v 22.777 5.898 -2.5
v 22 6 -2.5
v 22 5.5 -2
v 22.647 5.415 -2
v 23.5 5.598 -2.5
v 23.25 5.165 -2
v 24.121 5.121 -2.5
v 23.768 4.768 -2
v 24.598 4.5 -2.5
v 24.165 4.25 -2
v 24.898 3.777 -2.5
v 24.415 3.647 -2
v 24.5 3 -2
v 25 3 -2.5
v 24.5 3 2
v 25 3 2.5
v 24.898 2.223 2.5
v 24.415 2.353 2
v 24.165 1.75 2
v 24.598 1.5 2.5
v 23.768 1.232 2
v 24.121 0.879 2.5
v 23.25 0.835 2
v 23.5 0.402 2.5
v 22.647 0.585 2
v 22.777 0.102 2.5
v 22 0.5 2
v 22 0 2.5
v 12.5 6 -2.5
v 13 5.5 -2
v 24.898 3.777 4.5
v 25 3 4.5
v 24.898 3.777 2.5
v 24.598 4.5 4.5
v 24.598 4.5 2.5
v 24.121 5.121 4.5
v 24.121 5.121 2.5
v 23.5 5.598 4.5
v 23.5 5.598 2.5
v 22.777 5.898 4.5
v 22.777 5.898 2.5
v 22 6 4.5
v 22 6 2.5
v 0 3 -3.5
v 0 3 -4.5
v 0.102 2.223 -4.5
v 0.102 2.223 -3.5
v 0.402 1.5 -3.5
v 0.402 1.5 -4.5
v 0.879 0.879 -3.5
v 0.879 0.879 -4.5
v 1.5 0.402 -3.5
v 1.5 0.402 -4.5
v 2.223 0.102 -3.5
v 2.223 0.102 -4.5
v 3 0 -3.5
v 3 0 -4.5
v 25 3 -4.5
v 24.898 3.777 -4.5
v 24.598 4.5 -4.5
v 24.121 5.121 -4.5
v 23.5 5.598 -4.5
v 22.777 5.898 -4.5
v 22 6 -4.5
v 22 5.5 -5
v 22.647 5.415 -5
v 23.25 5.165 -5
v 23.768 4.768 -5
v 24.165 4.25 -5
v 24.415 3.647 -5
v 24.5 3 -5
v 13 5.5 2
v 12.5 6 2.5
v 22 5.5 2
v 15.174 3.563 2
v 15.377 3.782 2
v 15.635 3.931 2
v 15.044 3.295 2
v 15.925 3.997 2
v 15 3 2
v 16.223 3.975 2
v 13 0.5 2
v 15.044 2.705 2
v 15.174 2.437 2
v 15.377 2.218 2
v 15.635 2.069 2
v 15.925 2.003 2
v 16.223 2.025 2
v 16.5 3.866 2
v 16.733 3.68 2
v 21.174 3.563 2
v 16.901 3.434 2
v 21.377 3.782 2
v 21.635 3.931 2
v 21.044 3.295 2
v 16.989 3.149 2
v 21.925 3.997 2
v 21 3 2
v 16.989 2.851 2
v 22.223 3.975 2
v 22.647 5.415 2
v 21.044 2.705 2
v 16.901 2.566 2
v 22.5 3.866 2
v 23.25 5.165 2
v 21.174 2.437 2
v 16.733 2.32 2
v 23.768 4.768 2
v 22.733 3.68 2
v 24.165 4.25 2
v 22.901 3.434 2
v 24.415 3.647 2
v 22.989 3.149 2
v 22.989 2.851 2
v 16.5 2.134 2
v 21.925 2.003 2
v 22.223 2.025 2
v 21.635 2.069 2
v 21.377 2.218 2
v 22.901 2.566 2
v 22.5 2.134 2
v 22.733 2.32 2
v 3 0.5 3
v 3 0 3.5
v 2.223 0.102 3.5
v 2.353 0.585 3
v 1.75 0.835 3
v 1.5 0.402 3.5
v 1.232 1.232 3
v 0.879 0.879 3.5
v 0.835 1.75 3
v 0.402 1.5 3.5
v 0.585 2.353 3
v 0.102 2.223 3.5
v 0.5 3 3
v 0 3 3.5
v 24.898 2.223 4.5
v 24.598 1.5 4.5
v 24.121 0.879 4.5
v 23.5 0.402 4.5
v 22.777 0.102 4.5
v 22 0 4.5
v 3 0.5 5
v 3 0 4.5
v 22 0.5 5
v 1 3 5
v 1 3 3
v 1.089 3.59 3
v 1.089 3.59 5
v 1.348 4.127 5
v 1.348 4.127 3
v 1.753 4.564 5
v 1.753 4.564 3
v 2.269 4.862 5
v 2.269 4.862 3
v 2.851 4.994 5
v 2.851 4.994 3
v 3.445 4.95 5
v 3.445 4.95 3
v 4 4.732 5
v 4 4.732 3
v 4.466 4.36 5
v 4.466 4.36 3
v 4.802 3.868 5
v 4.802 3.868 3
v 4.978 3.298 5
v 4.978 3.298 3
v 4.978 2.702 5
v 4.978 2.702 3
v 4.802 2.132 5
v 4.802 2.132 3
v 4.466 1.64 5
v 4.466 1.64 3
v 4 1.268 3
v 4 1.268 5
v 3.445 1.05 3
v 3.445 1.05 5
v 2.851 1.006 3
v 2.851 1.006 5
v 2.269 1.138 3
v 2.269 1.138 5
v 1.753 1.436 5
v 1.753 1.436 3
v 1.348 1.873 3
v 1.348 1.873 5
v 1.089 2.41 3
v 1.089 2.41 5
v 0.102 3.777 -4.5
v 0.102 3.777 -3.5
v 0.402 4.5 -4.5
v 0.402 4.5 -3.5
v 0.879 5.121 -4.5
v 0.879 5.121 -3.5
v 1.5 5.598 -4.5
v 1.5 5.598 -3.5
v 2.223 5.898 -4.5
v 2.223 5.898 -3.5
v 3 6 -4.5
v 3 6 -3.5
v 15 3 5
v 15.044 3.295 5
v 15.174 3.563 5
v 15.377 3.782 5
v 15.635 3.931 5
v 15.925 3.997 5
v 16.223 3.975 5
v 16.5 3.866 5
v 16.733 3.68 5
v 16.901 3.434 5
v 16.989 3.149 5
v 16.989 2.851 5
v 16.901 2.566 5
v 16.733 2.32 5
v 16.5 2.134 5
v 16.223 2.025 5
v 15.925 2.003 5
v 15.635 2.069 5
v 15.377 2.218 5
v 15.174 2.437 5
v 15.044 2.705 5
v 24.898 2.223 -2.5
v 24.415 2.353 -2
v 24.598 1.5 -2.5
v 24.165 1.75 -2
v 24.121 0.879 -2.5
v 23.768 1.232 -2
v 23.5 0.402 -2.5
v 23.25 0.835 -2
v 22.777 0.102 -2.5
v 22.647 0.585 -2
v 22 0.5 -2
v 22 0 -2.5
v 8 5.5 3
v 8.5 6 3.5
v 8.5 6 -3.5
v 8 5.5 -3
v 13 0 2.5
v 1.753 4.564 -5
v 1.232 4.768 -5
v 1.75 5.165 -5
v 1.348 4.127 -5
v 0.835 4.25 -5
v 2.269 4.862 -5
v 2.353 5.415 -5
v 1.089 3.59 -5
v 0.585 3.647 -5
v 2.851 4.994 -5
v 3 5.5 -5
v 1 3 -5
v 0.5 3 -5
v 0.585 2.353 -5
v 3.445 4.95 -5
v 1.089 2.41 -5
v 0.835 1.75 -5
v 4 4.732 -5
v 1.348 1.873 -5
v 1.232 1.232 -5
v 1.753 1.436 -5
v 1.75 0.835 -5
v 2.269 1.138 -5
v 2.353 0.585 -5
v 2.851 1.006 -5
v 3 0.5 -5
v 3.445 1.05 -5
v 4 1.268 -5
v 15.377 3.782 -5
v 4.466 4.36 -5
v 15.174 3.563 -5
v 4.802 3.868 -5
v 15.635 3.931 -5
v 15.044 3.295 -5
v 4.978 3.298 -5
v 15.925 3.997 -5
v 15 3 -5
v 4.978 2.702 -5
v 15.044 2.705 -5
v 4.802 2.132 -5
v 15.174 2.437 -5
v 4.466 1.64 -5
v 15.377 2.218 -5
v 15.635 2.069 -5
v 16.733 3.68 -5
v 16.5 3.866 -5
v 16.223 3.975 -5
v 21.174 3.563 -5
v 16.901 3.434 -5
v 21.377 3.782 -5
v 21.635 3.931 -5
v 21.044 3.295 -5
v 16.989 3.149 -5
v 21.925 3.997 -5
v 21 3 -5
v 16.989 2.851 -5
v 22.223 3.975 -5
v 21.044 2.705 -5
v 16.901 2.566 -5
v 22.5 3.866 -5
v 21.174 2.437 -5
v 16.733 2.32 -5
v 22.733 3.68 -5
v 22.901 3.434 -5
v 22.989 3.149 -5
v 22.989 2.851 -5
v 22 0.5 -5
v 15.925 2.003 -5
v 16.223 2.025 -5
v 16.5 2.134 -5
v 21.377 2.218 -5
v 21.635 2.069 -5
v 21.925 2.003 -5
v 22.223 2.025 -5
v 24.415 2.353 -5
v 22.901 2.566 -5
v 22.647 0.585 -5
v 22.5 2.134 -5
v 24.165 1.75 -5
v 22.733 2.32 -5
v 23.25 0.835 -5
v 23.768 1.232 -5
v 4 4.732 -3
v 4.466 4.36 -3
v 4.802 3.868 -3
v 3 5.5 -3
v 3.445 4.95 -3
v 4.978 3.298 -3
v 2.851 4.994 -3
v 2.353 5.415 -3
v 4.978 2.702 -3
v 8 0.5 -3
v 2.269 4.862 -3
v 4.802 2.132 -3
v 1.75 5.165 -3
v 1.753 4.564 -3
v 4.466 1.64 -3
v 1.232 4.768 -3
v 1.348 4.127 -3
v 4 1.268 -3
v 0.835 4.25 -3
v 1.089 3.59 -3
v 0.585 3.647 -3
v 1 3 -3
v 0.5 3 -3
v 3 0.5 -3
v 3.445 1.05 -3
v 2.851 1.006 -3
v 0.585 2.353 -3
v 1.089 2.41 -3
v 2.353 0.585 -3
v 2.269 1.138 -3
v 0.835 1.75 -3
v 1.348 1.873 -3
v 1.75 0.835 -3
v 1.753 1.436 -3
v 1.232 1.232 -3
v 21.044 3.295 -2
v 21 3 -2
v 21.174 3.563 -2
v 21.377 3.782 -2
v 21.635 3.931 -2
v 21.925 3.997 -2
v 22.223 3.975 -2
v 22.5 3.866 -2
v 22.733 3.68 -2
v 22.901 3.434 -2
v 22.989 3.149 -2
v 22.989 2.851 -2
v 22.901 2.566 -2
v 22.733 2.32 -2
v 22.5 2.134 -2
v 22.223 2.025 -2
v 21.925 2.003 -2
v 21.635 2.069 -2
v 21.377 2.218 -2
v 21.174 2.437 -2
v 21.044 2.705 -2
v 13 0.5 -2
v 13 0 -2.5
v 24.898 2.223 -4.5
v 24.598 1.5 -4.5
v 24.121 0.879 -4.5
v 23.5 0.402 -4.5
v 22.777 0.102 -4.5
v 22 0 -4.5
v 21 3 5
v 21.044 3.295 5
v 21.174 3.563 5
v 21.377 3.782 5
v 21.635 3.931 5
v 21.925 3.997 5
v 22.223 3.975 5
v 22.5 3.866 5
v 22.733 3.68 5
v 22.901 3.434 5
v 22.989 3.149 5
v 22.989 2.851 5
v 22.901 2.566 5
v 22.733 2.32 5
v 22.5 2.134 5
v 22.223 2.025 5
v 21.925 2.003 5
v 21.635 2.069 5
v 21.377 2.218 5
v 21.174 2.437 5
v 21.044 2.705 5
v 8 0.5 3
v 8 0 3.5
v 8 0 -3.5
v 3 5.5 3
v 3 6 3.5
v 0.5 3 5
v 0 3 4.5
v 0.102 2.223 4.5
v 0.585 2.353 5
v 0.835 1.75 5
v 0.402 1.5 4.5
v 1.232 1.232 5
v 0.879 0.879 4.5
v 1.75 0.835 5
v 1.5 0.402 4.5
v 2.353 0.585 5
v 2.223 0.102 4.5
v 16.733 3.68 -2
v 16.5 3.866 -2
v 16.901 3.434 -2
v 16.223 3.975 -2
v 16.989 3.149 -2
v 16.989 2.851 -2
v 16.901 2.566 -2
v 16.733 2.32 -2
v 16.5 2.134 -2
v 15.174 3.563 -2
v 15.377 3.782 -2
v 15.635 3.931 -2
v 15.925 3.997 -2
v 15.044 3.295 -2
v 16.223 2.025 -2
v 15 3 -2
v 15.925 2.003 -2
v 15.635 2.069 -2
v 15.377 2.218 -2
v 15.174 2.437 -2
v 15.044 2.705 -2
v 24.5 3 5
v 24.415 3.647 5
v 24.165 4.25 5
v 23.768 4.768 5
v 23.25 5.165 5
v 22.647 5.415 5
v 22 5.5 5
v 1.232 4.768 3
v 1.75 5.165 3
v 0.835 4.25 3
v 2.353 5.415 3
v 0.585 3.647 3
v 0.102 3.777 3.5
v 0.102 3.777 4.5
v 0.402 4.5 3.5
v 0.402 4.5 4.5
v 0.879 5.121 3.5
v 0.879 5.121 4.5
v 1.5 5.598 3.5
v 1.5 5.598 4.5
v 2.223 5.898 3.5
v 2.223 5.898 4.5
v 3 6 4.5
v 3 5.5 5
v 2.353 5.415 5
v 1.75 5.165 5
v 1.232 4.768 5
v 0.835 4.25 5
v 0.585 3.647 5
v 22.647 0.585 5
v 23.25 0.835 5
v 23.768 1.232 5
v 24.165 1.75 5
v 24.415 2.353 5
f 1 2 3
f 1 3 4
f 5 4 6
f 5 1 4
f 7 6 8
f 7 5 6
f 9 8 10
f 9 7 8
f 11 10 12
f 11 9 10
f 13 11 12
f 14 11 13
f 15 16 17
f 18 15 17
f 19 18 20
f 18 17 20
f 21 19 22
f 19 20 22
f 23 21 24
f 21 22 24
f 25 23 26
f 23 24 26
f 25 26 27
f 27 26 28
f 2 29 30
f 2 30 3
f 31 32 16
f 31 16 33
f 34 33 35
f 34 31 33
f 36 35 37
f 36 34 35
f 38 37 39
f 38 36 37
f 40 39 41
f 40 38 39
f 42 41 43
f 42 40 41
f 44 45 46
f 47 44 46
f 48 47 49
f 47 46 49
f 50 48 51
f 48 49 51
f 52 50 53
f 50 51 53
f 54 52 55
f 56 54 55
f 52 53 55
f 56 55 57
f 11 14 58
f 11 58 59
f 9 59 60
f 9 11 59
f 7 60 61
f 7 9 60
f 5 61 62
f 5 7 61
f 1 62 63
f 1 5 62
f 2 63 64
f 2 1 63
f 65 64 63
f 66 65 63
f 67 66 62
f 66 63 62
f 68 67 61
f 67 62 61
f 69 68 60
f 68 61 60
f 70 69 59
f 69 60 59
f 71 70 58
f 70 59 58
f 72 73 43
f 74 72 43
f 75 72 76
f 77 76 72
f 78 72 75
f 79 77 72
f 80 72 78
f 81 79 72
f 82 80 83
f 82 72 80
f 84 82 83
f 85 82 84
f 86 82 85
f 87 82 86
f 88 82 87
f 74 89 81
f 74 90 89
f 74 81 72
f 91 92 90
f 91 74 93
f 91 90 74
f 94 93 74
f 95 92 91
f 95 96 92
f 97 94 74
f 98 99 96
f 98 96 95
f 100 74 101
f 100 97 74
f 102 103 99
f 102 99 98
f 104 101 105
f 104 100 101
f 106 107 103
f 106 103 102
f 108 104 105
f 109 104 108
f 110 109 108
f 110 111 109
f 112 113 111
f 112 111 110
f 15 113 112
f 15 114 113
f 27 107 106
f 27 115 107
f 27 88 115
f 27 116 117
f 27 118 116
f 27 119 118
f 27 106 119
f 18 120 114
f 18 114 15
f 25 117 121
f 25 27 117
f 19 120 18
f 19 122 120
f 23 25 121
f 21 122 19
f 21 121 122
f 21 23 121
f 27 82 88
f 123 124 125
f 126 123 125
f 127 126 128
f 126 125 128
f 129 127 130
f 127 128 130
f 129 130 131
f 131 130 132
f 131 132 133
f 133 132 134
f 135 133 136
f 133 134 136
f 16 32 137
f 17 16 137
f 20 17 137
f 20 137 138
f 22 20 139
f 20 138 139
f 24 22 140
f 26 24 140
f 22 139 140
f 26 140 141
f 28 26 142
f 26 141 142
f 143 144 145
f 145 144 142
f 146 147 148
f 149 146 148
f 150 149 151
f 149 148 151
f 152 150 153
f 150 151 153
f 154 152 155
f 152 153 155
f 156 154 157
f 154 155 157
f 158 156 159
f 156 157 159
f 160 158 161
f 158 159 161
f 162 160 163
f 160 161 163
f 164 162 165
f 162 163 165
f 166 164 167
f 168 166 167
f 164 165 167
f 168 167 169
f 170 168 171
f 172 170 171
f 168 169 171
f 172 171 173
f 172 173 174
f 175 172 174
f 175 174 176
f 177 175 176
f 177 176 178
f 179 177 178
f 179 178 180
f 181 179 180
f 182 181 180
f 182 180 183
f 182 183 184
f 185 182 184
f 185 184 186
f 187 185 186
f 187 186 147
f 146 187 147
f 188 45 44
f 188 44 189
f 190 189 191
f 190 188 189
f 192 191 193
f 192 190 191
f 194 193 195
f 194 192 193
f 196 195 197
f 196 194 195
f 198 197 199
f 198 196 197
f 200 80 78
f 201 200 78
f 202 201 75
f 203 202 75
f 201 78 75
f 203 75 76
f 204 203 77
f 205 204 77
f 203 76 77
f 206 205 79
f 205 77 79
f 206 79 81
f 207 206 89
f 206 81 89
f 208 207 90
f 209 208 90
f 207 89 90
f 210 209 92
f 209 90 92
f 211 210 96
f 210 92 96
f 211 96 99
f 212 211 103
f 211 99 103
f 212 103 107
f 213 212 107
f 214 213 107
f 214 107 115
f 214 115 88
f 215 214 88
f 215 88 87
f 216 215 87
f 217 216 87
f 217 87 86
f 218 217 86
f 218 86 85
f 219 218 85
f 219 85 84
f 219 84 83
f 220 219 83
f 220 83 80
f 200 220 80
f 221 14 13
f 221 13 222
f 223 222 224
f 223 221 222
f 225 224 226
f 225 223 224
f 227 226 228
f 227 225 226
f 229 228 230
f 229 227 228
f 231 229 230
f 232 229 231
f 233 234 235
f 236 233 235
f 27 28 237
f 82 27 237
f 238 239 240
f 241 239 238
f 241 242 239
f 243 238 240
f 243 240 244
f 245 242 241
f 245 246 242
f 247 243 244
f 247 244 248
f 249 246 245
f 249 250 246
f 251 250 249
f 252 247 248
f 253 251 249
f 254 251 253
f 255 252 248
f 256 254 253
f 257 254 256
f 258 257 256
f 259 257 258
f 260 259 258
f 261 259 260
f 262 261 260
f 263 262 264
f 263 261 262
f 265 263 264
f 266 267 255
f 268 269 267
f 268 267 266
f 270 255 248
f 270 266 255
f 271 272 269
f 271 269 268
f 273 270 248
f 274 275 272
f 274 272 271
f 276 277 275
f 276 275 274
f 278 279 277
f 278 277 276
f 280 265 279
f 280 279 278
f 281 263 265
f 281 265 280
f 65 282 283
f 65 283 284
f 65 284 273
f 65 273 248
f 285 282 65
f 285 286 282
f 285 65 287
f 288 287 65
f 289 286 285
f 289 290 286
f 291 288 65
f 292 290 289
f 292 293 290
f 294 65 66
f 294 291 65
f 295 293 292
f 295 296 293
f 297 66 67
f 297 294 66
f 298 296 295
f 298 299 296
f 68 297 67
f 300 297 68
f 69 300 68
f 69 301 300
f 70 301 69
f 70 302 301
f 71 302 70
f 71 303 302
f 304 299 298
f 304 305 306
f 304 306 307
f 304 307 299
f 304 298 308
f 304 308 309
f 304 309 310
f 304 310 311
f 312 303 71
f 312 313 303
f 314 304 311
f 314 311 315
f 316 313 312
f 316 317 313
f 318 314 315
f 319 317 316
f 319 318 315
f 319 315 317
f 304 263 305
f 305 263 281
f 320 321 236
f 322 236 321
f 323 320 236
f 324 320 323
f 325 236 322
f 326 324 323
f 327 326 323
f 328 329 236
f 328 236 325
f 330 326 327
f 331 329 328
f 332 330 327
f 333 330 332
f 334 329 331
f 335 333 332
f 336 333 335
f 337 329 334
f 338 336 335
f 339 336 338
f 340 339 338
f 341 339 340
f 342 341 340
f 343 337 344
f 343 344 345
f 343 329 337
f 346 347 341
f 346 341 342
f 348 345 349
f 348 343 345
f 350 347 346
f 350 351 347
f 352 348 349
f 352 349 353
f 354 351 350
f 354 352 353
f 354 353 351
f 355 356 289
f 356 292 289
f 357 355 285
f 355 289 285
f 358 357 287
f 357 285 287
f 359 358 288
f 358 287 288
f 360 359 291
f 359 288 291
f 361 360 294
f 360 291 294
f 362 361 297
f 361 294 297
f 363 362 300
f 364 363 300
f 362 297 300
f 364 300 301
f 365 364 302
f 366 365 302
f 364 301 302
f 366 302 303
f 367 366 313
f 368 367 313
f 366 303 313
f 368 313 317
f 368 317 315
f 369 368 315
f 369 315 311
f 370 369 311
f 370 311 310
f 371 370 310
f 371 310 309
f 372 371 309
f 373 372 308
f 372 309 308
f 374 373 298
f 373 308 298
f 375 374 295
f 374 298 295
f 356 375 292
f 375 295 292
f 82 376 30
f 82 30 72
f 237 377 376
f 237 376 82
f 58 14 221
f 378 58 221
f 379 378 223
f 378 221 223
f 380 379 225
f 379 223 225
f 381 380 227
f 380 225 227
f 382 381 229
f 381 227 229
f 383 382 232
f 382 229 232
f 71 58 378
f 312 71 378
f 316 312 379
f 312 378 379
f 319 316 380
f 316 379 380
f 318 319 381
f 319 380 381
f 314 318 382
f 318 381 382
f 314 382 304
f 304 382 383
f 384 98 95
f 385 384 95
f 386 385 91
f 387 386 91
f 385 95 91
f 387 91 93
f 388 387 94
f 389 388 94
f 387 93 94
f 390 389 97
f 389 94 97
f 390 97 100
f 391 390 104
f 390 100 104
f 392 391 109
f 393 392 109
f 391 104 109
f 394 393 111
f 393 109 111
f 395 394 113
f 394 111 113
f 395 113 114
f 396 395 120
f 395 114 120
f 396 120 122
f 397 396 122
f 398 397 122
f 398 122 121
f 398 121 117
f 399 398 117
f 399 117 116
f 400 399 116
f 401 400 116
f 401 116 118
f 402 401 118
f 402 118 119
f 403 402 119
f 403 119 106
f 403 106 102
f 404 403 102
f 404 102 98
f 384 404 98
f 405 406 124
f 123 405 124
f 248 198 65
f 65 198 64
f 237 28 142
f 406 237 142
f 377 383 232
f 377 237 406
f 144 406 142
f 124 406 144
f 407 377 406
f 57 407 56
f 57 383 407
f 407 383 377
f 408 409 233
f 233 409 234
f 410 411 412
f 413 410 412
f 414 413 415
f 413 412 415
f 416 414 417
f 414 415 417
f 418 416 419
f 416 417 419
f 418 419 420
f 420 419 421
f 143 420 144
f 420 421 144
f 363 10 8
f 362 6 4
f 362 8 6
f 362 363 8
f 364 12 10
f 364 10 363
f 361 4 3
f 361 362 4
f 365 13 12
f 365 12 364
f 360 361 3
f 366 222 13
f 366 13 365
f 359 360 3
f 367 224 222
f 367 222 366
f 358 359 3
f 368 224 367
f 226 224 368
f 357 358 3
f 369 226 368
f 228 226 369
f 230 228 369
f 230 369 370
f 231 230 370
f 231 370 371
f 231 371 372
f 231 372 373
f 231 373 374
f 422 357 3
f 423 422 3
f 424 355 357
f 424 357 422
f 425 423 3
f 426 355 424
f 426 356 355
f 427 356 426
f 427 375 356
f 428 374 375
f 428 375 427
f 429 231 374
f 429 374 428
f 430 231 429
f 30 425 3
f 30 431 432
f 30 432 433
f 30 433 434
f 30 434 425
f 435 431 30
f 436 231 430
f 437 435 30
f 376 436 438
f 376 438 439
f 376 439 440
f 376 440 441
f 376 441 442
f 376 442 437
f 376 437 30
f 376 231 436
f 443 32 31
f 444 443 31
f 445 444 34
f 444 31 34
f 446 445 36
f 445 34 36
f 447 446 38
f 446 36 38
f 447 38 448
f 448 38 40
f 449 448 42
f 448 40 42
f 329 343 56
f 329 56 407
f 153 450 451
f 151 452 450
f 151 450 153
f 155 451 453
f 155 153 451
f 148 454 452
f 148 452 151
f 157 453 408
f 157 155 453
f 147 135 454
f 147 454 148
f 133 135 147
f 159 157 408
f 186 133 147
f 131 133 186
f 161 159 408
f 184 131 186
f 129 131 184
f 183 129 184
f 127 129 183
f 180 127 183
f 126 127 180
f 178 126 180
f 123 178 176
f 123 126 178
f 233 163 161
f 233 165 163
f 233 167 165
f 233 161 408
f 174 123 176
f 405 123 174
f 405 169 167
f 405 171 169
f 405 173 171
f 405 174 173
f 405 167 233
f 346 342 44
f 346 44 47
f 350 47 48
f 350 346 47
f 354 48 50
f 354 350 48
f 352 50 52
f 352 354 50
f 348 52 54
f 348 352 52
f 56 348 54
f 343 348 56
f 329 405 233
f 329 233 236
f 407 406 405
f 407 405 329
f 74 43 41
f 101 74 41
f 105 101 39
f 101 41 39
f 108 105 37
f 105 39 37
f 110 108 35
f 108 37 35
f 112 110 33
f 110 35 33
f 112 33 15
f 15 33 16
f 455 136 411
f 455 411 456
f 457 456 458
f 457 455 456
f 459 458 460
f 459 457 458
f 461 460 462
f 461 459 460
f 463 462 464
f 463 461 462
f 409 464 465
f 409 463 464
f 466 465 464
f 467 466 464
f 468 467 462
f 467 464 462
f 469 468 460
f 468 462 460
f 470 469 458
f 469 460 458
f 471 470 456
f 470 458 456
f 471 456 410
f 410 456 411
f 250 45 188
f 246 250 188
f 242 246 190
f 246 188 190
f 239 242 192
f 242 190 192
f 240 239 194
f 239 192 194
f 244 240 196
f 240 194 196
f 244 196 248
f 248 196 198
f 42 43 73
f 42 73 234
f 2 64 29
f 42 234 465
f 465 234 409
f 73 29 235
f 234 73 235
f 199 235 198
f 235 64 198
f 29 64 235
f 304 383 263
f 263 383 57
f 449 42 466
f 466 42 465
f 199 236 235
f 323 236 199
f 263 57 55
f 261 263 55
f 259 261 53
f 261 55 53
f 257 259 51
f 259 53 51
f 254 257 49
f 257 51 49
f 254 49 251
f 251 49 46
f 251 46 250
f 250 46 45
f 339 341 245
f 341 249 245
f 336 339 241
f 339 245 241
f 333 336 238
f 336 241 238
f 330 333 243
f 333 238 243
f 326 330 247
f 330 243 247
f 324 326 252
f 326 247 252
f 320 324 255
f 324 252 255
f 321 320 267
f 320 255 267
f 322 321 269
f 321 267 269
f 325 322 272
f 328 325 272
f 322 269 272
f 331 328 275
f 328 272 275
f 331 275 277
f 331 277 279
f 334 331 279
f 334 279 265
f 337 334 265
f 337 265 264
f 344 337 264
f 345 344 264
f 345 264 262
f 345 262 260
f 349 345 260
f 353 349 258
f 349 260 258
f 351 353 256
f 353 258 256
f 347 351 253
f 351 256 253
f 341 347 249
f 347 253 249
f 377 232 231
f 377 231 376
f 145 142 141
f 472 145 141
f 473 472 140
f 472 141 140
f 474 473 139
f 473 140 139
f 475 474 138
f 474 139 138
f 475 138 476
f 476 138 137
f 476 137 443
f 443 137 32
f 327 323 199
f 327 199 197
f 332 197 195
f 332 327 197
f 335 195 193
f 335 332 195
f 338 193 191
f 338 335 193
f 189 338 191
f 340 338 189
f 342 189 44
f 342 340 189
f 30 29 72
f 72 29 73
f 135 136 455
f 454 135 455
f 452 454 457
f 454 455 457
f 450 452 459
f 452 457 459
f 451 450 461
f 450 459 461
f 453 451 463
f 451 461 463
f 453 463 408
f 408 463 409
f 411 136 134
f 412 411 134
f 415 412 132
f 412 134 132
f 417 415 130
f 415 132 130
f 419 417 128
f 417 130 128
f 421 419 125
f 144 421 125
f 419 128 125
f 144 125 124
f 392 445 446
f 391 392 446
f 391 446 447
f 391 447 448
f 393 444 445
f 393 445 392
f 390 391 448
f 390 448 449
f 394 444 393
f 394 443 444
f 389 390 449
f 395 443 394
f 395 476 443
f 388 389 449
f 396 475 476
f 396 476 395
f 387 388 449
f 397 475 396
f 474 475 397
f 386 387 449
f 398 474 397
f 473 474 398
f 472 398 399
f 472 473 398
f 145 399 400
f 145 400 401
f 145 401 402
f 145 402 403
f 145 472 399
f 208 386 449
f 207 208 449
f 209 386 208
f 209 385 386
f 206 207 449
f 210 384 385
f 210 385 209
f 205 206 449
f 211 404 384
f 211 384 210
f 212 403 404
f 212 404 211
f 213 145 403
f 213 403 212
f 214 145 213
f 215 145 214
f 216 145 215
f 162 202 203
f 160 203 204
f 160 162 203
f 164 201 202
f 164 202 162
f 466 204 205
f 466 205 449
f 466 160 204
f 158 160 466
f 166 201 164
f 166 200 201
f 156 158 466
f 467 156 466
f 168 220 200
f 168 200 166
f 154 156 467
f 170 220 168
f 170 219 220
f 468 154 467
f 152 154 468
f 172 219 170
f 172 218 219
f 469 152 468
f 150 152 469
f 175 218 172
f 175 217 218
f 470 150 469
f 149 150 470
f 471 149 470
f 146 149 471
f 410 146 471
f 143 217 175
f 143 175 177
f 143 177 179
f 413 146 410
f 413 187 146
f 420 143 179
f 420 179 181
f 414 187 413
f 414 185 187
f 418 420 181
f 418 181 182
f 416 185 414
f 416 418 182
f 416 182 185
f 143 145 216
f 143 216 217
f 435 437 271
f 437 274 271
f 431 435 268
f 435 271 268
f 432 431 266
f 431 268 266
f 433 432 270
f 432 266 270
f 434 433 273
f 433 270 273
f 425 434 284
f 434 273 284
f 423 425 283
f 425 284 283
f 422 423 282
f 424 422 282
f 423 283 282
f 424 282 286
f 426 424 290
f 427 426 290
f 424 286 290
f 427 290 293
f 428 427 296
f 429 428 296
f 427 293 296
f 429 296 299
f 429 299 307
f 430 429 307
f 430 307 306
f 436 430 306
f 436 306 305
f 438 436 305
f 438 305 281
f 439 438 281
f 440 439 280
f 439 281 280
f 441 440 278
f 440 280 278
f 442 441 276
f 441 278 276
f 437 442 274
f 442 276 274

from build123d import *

# Parameters (mm, degrees)
BOSS_EXTRUDE1_DEPTH       = 6
FILLET1_R                 = 3
F_4_0MM_DOWEL_HOLE1_D     = 4
F_4_0MM_DOWEL_HOLE1_DEPTH = 10
F_4_0MM_DOWEL_HOLE1_TIP   = 1.201721238
F_2_0MM_DOWEL_HOLE1_D     = 2
F_2_0MM_DOWEL_HOLE1_DEPTH = 10
F_2_0MM_DOWEL_HOLE1_TIP   = 0.600860619
CHAMFER1_SIZE             = 0.5


with BuildPart() as part:
    # Sketch2 → Boss-Extrude1 (new body)
    with BuildSketch(Plane(origin=(0, 0, 0), x_dir=(1, 0, 0), z_dir=(0, 1, 0))):
        Polygon((0, 3), (0, 5), (25, 5), (25, 2), (13, 2), (13, -2), (25, -2), (25, -5), (0, -5), (0, -3), (8, -3), (8, 3), align=None)
    extrude(amount=BOSS_EXTRUDE1_DEPTH)

    # Fillet1
    fillet1_edges = [part.edges().sort_by_distance(p)[0] for p in [
        (25, 6, -3.5),
        (25, 0, -3.5),
        (25, 0, 3.5),
        (25, 6, 3.5),
        (0, 6, 4),
        (0, 0, 4),
        (0, 0, -4),
        (0, 6, -4),
    ]]
    fillet(fillet1_edges, radius=FILLET1_R - 0.0001)  # a hair under: the kernel refuses the full size

    # Ø4.0mm Dowel Hole1
    with Locations(Plane.XY.offset(5)):
        with Locations((3, 3)):
            Hole(F_4_0MM_DOWEL_HOLE1_D / 2, depth=F_4_0MM_DOWEL_HOLE1_DEPTH)
            with Locations((0, 0, -(F_4_0MM_DOWEL_HOLE1_DEPTH + F_4_0MM_DOWEL_HOLE1_TIP / 2))):  # 118° drill point
                Cone(0, F_4_0MM_DOWEL_HOLE1_D / 2, F_4_0MM_DOWEL_HOLE1_TIP, mode=Mode.SUBTRACT)

    # Ø2.0mm Dowel Hole1
    with Locations(Plane(origin=(16, 3, 5), x_dir=(1, 0, 0), z_dir=(0, 0, 1))):
        with Locations((0, 0), (6, 0)):
            Hole(F_2_0MM_DOWEL_HOLE1_D / 2, depth=F_2_0MM_DOWEL_HOLE1_DEPTH)
            with Locations((0, 0, -(F_2_0MM_DOWEL_HOLE1_DEPTH + F_2_0MM_DOWEL_HOLE1_TIP / 2))):  # 118° drill point
                Cone(0, F_2_0MM_DOWEL_HOLE1_D / 2, F_2_0MM_DOWEL_HOLE1_TIP, mode=Mode.SUBTRACT)

    # Chamfer1
    chamfer1_edges = [part.edges().sort_by_distance(p)[0] for p in [
        (5.49995, 6, 3),
        (17.50005, 0, -2),
        (5.49995, 0, 3),
        (13, 6, 0),
        (5.49995, 6, -3),
        (12.5, 6, 5),
        (17.50005, 6, 2),
        (17.50005, 6, -2),
        (12.5, 6, -5),
        (12.5, 0, -5),
        (0.878650367, 5.121349633, -5),
        (0.878650367, 0.878650367, -5),
        (24.121349633, 0.878650367, -5),
        (24.121349633, 5.121349633, -5),
        (24.121349633, 0.878650367, -2),
        (24.121349633, 5.121349633, -2),
        (5.49995, 0, -3),
        (17.50005, 0, 2),
        (12.5, 0, 5),
        (24.121349633, 5.121349633, 2),
        (24.121349633, 0.878650367, 2),
        (0.878650367, 0.878650367, 5),
        (0.878650367, 5.121349633, 5),
        (24.121349633, 5.121349633, 5),
        (24.121349633, 0.878650367, 5),
        (0.878650367, 0.878650367, 3),
        (0.878650367, 5.121349633, 3),
        (0.878650367, 5.121349633, -3),
        (0.878650367, 0.878650367, -3),
        (8, 6, 0),
    ]]
    chamfer(chamfer1_edges, length=CHAMFER1_SIZE)


solid = part.part
